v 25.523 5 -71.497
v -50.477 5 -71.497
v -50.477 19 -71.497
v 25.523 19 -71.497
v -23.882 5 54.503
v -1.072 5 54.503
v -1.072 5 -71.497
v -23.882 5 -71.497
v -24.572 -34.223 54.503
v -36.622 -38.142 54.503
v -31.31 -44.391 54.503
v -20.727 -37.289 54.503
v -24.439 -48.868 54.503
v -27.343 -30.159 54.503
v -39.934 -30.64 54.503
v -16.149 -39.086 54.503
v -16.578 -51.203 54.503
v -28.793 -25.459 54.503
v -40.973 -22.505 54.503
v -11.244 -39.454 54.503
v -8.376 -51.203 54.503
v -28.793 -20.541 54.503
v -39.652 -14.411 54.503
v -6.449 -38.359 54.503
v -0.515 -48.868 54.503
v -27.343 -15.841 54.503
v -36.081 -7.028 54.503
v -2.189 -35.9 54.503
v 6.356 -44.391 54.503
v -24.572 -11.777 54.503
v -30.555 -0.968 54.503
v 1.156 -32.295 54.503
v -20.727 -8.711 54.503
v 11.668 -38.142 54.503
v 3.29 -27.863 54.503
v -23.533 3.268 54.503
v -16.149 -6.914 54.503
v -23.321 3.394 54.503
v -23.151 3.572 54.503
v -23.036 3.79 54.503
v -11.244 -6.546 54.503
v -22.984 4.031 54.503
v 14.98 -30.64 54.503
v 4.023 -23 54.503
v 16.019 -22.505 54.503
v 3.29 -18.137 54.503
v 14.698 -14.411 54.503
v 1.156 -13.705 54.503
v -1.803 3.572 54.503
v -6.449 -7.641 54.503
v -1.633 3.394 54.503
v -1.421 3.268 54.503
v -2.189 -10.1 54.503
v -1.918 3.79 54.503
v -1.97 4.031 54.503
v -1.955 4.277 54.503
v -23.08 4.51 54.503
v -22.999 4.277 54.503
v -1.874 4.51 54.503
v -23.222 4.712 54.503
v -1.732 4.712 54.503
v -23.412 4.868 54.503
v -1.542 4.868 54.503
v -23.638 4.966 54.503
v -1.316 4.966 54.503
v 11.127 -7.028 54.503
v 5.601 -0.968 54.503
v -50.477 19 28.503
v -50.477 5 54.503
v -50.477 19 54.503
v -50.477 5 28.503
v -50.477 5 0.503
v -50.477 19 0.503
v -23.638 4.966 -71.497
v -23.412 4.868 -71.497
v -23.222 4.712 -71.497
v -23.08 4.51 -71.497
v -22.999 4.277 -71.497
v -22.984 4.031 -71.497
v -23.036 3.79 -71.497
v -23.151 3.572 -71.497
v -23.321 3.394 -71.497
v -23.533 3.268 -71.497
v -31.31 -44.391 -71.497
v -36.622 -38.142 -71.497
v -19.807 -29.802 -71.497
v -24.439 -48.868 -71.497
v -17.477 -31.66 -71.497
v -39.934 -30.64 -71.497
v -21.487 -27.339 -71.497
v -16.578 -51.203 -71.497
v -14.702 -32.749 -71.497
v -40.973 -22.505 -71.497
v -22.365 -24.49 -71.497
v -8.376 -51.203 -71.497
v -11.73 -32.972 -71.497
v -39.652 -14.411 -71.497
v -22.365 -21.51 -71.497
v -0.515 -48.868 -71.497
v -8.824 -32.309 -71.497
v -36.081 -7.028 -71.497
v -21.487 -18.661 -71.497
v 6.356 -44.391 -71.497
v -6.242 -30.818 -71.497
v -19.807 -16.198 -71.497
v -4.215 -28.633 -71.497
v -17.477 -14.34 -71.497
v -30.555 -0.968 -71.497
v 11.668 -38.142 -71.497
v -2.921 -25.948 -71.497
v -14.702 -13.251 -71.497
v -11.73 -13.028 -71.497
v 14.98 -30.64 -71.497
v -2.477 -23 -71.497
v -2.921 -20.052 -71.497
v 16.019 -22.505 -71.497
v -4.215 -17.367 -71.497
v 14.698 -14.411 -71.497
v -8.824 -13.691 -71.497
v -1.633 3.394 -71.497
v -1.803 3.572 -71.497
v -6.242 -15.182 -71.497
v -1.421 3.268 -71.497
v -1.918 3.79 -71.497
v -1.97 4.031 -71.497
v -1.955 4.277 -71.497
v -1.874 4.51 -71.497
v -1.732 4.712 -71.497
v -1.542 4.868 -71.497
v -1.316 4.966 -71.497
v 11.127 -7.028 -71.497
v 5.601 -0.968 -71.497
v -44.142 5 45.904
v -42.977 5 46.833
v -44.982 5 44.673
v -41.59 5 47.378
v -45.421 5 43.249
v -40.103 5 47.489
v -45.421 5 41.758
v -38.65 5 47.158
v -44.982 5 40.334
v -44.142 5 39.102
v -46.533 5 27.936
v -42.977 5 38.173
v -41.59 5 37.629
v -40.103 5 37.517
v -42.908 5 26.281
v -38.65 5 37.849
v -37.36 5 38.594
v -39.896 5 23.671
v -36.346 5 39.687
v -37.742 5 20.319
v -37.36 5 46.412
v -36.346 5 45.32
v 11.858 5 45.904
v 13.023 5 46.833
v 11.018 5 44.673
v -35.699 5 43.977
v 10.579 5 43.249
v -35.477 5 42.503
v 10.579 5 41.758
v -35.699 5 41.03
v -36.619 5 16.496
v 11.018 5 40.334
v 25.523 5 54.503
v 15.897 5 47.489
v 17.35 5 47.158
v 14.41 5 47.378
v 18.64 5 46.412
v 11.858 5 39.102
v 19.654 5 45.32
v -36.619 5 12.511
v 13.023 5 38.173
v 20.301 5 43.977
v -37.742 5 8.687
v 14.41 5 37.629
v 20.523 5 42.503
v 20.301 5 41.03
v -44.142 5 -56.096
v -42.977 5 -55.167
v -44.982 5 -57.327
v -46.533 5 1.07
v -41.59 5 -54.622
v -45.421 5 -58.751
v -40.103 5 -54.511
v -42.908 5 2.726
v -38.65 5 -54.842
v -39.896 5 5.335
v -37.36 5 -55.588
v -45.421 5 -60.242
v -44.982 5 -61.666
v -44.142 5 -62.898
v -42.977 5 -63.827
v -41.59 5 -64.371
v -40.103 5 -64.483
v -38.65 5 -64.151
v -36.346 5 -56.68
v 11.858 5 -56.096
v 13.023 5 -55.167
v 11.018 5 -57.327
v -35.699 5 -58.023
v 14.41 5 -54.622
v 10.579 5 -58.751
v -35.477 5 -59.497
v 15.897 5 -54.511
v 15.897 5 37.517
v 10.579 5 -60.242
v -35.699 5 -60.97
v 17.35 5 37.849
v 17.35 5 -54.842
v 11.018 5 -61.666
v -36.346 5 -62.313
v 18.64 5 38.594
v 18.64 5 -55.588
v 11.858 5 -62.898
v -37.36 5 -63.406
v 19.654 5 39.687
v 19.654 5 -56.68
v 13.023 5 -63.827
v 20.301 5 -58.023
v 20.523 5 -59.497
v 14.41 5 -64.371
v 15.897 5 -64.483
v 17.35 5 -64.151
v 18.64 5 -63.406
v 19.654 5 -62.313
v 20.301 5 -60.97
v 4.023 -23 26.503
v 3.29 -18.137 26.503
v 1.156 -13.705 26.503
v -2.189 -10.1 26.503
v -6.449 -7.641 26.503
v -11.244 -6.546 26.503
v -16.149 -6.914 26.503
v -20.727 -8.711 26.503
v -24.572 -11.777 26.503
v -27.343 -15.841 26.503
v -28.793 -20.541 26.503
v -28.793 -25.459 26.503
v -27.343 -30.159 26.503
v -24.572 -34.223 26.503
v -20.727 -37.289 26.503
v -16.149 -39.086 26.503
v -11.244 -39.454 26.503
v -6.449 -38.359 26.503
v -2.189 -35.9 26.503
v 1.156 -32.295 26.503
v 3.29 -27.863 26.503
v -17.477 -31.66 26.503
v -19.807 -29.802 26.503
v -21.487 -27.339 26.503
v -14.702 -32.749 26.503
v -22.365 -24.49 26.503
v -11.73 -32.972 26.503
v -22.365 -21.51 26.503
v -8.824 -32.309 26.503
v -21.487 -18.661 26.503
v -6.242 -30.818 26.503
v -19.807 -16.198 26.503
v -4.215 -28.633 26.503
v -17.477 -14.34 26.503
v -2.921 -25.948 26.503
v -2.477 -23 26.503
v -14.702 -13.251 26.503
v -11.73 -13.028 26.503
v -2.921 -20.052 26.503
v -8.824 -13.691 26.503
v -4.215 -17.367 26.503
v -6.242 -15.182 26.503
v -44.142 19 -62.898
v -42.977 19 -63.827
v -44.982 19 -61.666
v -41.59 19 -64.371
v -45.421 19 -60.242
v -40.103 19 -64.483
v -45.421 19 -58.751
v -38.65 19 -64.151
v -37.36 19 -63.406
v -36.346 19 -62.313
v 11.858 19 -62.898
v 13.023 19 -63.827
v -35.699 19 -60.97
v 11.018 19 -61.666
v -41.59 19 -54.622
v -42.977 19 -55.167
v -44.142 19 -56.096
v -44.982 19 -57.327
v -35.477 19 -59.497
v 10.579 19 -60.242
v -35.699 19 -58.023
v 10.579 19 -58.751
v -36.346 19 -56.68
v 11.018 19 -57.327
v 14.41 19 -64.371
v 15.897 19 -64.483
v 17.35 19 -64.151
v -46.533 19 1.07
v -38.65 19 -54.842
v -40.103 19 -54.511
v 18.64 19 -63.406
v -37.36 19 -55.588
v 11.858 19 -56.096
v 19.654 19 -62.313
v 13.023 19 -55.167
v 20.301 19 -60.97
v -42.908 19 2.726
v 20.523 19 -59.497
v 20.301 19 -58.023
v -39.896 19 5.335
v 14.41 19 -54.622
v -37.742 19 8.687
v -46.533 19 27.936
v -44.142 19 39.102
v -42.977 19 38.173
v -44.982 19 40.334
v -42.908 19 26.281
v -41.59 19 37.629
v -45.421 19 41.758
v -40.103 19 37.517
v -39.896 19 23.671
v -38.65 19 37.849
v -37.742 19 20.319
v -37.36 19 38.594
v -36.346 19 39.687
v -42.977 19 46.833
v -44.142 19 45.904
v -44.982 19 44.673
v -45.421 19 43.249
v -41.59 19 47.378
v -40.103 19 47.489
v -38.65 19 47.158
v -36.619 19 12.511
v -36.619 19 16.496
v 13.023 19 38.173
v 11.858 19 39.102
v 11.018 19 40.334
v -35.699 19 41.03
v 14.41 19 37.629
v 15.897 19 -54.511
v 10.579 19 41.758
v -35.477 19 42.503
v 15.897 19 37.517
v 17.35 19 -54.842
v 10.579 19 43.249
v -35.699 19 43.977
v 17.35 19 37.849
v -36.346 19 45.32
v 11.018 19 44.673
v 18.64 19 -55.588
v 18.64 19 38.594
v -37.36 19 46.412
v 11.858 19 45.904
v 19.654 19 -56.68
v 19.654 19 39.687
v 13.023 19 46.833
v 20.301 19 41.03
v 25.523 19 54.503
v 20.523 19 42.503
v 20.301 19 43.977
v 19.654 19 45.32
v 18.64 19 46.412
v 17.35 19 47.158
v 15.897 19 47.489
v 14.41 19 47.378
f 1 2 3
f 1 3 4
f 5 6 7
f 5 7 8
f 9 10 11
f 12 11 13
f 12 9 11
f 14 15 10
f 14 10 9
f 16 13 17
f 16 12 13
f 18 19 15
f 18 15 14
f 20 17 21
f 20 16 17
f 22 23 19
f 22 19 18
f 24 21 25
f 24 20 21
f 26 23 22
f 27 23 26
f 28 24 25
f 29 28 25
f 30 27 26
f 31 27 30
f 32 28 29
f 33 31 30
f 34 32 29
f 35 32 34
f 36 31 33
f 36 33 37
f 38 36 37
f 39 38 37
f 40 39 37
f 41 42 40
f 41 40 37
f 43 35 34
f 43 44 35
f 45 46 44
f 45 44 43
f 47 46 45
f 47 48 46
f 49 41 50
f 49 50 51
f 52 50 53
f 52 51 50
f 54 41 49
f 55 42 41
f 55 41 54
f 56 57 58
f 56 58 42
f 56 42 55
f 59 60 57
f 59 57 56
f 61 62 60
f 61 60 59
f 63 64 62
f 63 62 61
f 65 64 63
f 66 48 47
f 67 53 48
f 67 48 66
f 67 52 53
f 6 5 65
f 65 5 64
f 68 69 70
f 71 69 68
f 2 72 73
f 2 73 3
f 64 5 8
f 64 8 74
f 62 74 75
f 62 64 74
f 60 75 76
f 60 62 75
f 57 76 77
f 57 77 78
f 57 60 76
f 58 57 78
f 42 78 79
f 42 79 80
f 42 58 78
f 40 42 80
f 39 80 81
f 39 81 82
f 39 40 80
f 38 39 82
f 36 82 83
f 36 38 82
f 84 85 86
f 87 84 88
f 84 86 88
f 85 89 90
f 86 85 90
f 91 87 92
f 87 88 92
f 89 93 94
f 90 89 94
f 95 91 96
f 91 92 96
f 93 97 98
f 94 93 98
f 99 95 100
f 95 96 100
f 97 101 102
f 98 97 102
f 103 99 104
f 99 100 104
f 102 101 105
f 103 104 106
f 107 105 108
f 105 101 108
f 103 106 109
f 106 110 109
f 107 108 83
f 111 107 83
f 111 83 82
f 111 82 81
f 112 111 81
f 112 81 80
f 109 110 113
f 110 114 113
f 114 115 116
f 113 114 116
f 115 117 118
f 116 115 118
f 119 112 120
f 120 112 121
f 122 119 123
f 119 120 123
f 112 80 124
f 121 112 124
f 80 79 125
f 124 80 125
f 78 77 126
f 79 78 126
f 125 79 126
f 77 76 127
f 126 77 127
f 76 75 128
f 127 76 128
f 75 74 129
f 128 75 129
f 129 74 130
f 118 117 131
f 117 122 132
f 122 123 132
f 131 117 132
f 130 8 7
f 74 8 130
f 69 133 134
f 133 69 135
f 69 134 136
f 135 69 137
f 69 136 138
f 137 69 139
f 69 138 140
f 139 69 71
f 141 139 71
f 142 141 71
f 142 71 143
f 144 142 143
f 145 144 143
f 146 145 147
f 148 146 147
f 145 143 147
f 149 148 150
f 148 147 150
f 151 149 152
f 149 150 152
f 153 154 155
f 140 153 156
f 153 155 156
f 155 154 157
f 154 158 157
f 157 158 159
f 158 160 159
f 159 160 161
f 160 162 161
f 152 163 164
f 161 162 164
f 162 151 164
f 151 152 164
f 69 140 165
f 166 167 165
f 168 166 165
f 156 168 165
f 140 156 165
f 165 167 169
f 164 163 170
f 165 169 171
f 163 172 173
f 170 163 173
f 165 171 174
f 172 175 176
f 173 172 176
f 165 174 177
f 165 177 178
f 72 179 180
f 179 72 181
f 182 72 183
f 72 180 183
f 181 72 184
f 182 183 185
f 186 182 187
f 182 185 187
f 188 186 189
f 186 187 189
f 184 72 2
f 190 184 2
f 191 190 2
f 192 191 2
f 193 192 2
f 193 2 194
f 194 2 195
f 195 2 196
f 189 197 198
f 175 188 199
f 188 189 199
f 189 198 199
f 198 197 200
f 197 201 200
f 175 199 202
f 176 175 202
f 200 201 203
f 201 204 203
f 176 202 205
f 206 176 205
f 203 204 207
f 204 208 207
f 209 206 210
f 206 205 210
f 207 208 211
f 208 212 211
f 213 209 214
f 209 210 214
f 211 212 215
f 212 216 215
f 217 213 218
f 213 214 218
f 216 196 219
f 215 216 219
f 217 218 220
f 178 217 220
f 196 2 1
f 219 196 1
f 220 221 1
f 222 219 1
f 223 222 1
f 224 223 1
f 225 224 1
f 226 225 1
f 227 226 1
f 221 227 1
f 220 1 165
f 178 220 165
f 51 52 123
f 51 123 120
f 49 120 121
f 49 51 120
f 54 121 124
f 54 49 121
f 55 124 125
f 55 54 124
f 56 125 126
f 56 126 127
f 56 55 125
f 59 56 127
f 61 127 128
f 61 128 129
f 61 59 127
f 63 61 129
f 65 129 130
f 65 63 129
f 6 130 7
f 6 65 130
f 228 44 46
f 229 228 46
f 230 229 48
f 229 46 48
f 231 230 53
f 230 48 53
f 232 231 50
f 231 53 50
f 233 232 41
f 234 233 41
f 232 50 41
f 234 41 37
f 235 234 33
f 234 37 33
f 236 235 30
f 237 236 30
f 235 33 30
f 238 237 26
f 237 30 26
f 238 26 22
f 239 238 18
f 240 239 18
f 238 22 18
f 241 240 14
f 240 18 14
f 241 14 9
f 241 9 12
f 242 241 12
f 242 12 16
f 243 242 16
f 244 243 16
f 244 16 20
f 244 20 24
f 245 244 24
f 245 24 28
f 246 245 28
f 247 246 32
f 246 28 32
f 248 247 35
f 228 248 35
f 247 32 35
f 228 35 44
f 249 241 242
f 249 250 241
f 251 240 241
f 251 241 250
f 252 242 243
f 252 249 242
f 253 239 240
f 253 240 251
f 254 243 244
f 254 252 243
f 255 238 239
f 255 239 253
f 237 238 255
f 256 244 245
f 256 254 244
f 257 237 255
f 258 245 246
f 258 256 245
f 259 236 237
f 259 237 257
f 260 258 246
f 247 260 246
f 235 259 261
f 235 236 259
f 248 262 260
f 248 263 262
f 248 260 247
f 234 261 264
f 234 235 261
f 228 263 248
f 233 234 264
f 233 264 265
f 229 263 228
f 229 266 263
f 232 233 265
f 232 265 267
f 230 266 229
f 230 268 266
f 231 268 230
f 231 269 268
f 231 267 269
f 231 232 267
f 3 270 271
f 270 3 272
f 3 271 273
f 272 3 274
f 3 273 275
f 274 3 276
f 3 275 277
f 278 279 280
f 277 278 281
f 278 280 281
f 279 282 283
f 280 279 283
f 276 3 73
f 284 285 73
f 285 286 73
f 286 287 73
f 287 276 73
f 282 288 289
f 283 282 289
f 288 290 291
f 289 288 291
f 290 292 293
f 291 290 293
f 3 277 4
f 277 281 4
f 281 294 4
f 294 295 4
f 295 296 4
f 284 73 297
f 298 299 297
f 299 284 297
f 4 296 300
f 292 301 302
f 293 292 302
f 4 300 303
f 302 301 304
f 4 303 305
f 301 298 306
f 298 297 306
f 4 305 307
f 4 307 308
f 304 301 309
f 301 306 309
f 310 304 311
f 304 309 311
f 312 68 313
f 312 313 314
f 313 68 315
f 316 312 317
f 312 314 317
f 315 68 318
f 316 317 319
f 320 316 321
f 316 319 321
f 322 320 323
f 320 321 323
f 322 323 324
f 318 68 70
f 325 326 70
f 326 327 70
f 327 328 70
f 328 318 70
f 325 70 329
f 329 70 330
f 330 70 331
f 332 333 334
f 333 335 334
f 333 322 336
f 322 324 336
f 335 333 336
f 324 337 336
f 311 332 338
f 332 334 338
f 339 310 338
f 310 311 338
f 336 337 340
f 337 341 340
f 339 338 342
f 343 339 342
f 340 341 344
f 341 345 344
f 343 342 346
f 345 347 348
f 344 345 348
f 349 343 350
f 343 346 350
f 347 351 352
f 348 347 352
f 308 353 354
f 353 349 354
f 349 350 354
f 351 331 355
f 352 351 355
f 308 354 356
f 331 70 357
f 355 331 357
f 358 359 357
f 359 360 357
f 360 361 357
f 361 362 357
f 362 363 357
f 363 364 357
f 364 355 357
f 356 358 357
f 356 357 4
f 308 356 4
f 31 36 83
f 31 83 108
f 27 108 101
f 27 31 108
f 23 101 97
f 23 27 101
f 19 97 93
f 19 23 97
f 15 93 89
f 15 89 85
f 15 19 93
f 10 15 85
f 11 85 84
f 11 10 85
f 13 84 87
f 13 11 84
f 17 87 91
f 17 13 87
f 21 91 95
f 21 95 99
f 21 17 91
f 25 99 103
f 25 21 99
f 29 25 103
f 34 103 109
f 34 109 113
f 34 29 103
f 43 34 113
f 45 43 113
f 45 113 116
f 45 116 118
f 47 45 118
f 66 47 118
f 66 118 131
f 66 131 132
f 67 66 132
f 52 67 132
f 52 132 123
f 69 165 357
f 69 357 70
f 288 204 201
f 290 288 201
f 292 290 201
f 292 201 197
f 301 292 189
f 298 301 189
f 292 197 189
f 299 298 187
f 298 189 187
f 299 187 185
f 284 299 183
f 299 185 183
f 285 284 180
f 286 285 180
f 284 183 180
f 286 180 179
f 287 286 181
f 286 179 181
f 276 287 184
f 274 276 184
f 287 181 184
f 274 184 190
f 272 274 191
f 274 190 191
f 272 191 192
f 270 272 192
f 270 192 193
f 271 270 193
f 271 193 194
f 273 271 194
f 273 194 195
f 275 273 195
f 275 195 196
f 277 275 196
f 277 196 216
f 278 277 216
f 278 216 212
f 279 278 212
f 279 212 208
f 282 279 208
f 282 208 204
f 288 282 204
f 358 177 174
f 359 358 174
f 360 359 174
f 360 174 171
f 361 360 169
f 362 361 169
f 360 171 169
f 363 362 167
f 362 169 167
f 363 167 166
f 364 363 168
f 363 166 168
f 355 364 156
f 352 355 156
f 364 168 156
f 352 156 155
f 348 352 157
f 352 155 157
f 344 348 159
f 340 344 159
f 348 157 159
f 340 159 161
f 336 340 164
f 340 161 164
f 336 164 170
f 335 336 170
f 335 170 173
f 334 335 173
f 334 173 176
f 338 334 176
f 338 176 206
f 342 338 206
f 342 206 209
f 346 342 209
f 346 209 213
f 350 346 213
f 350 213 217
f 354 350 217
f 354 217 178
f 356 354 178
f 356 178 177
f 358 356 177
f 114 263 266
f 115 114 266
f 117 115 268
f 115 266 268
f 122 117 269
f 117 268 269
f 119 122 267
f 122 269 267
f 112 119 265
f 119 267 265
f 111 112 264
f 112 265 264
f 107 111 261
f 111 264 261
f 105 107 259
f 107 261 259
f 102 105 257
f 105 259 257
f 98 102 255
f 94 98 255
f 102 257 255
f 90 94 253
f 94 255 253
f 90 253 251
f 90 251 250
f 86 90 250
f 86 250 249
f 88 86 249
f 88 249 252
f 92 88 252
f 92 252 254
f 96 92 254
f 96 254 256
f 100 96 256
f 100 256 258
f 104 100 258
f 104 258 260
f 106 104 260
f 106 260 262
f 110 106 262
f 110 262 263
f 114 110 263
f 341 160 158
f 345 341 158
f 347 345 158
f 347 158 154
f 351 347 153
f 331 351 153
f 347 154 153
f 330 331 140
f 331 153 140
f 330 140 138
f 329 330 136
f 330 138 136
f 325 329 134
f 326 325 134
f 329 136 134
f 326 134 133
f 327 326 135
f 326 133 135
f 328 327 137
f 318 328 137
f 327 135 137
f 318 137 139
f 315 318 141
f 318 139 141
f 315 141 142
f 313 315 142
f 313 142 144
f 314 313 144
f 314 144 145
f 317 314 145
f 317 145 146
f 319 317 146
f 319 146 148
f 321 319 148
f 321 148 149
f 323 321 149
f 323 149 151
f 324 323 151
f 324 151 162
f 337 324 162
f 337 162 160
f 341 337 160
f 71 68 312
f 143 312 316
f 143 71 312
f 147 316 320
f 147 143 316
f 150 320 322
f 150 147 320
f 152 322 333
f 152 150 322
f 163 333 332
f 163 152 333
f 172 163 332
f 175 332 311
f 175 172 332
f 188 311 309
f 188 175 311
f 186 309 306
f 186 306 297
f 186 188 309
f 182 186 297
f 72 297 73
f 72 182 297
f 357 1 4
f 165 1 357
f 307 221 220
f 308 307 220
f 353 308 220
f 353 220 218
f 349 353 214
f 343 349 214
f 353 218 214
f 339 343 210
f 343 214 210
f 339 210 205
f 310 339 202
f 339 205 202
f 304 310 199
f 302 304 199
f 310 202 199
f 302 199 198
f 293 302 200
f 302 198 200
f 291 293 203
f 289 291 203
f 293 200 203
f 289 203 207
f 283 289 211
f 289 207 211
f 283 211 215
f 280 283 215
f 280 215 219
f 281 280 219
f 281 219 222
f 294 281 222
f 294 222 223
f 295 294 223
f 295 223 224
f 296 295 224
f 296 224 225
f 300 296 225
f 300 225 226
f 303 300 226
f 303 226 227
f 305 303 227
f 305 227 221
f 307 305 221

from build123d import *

# Parameters (mm, degrees)
F0_R     = 5
F1_DEPTH = 19
F2_W     = 76
F2_H     = 5
F3_DEPTH = 126.001
F4_R     = 10
F5_DEPTH = 126
F6_R     = 16.5
F7_DEPTH = 28


with BuildPart() as f1:
    # F0 (on Front) → F1 (new body)
    with BuildSketch(Plane.XZ):
        with BuildLine():
            Line((25.523024, 54.50329), (-50.476976, 54.50329))
            Line((-50.476976, 54.50329), (-50.476976, 28.50329))
            ThreePointArc((-50.476976, 28.50329), (-36.476976, 14.50329), (-50.476976, 0.50329))
            Line((-50.476976, 0.50329), (-50.476976, -71.49671))
            Line((-50.476976, -71.49671), (25.523024, -71.49671))
            Line((25.523024, -71.49671), (25.523024, 54.50329))
        make_face()
        with Locations((-40.476976, -59.49671)):
            Circle(F0_R, mode=Mode.SUBTRACT)
        with Locations((15.523024, -59.49671)):
            Circle(F0_R, mode=Mode.SUBTRACT)
        with Locations((-40.476976, 42.50329)):
            Circle(F0_R, mode=Mode.SUBTRACT)
        with Locations((15.523024, 42.50329)):
            Circle(F0_R, mode=Mode.SUBTRACT)
    extrude(amount=-F1_DEPTH)

    # F2 (on face) → F3 (cut, through all)
    with BuildSketch(Plane(origin=(0, 0, -71.49671), x_dir=(1, 0, 0), z_dir=(0, 0, -1))):
        with Locations((-12.476976, -2.5)):
            Rectangle(F2_W, F2_H)
    extrude(amount=-F3_DEPTH, mode=Mode.SUBTRACT)


with BuildPart() as f5:
    # F4 (on face) → F5 (new body, through all)
    with BuildSketch(Plane.XY.offset(54.50329)):
        with BuildLine():
            ThreePointArc((-23.88219, 5), (-22.998867, 4.277169), (-23.532622, 3.268283))
            ThreePointArc((-23.532622, 3.268283), (-12.476976, -51.5), (-1.421329, 3.268283))
            ThreePointArc((-1.421329, 3.268283), (-1.955085, 4.277169), (-1.071761, 5))
            Line((-1.071761, 5), (-23.88219, 5))
        make_face()
        with Locations((-12.476976, -23)):
            Circle(F4_R, mode=Mode.SUBTRACT)
    extrude(amount=-F5_DEPTH)

    # F6 (on face) → F7 (cut)
    with BuildSketch(Plane.XY.offset(54.50329)):
        with Locations((-12.476976, -23)):
            Circle(F6_R)
    extrude(amount=-F7_DEPTH, mode=Mode.SUBTRACT)


solid = Compound([f1.part, f5.part])
